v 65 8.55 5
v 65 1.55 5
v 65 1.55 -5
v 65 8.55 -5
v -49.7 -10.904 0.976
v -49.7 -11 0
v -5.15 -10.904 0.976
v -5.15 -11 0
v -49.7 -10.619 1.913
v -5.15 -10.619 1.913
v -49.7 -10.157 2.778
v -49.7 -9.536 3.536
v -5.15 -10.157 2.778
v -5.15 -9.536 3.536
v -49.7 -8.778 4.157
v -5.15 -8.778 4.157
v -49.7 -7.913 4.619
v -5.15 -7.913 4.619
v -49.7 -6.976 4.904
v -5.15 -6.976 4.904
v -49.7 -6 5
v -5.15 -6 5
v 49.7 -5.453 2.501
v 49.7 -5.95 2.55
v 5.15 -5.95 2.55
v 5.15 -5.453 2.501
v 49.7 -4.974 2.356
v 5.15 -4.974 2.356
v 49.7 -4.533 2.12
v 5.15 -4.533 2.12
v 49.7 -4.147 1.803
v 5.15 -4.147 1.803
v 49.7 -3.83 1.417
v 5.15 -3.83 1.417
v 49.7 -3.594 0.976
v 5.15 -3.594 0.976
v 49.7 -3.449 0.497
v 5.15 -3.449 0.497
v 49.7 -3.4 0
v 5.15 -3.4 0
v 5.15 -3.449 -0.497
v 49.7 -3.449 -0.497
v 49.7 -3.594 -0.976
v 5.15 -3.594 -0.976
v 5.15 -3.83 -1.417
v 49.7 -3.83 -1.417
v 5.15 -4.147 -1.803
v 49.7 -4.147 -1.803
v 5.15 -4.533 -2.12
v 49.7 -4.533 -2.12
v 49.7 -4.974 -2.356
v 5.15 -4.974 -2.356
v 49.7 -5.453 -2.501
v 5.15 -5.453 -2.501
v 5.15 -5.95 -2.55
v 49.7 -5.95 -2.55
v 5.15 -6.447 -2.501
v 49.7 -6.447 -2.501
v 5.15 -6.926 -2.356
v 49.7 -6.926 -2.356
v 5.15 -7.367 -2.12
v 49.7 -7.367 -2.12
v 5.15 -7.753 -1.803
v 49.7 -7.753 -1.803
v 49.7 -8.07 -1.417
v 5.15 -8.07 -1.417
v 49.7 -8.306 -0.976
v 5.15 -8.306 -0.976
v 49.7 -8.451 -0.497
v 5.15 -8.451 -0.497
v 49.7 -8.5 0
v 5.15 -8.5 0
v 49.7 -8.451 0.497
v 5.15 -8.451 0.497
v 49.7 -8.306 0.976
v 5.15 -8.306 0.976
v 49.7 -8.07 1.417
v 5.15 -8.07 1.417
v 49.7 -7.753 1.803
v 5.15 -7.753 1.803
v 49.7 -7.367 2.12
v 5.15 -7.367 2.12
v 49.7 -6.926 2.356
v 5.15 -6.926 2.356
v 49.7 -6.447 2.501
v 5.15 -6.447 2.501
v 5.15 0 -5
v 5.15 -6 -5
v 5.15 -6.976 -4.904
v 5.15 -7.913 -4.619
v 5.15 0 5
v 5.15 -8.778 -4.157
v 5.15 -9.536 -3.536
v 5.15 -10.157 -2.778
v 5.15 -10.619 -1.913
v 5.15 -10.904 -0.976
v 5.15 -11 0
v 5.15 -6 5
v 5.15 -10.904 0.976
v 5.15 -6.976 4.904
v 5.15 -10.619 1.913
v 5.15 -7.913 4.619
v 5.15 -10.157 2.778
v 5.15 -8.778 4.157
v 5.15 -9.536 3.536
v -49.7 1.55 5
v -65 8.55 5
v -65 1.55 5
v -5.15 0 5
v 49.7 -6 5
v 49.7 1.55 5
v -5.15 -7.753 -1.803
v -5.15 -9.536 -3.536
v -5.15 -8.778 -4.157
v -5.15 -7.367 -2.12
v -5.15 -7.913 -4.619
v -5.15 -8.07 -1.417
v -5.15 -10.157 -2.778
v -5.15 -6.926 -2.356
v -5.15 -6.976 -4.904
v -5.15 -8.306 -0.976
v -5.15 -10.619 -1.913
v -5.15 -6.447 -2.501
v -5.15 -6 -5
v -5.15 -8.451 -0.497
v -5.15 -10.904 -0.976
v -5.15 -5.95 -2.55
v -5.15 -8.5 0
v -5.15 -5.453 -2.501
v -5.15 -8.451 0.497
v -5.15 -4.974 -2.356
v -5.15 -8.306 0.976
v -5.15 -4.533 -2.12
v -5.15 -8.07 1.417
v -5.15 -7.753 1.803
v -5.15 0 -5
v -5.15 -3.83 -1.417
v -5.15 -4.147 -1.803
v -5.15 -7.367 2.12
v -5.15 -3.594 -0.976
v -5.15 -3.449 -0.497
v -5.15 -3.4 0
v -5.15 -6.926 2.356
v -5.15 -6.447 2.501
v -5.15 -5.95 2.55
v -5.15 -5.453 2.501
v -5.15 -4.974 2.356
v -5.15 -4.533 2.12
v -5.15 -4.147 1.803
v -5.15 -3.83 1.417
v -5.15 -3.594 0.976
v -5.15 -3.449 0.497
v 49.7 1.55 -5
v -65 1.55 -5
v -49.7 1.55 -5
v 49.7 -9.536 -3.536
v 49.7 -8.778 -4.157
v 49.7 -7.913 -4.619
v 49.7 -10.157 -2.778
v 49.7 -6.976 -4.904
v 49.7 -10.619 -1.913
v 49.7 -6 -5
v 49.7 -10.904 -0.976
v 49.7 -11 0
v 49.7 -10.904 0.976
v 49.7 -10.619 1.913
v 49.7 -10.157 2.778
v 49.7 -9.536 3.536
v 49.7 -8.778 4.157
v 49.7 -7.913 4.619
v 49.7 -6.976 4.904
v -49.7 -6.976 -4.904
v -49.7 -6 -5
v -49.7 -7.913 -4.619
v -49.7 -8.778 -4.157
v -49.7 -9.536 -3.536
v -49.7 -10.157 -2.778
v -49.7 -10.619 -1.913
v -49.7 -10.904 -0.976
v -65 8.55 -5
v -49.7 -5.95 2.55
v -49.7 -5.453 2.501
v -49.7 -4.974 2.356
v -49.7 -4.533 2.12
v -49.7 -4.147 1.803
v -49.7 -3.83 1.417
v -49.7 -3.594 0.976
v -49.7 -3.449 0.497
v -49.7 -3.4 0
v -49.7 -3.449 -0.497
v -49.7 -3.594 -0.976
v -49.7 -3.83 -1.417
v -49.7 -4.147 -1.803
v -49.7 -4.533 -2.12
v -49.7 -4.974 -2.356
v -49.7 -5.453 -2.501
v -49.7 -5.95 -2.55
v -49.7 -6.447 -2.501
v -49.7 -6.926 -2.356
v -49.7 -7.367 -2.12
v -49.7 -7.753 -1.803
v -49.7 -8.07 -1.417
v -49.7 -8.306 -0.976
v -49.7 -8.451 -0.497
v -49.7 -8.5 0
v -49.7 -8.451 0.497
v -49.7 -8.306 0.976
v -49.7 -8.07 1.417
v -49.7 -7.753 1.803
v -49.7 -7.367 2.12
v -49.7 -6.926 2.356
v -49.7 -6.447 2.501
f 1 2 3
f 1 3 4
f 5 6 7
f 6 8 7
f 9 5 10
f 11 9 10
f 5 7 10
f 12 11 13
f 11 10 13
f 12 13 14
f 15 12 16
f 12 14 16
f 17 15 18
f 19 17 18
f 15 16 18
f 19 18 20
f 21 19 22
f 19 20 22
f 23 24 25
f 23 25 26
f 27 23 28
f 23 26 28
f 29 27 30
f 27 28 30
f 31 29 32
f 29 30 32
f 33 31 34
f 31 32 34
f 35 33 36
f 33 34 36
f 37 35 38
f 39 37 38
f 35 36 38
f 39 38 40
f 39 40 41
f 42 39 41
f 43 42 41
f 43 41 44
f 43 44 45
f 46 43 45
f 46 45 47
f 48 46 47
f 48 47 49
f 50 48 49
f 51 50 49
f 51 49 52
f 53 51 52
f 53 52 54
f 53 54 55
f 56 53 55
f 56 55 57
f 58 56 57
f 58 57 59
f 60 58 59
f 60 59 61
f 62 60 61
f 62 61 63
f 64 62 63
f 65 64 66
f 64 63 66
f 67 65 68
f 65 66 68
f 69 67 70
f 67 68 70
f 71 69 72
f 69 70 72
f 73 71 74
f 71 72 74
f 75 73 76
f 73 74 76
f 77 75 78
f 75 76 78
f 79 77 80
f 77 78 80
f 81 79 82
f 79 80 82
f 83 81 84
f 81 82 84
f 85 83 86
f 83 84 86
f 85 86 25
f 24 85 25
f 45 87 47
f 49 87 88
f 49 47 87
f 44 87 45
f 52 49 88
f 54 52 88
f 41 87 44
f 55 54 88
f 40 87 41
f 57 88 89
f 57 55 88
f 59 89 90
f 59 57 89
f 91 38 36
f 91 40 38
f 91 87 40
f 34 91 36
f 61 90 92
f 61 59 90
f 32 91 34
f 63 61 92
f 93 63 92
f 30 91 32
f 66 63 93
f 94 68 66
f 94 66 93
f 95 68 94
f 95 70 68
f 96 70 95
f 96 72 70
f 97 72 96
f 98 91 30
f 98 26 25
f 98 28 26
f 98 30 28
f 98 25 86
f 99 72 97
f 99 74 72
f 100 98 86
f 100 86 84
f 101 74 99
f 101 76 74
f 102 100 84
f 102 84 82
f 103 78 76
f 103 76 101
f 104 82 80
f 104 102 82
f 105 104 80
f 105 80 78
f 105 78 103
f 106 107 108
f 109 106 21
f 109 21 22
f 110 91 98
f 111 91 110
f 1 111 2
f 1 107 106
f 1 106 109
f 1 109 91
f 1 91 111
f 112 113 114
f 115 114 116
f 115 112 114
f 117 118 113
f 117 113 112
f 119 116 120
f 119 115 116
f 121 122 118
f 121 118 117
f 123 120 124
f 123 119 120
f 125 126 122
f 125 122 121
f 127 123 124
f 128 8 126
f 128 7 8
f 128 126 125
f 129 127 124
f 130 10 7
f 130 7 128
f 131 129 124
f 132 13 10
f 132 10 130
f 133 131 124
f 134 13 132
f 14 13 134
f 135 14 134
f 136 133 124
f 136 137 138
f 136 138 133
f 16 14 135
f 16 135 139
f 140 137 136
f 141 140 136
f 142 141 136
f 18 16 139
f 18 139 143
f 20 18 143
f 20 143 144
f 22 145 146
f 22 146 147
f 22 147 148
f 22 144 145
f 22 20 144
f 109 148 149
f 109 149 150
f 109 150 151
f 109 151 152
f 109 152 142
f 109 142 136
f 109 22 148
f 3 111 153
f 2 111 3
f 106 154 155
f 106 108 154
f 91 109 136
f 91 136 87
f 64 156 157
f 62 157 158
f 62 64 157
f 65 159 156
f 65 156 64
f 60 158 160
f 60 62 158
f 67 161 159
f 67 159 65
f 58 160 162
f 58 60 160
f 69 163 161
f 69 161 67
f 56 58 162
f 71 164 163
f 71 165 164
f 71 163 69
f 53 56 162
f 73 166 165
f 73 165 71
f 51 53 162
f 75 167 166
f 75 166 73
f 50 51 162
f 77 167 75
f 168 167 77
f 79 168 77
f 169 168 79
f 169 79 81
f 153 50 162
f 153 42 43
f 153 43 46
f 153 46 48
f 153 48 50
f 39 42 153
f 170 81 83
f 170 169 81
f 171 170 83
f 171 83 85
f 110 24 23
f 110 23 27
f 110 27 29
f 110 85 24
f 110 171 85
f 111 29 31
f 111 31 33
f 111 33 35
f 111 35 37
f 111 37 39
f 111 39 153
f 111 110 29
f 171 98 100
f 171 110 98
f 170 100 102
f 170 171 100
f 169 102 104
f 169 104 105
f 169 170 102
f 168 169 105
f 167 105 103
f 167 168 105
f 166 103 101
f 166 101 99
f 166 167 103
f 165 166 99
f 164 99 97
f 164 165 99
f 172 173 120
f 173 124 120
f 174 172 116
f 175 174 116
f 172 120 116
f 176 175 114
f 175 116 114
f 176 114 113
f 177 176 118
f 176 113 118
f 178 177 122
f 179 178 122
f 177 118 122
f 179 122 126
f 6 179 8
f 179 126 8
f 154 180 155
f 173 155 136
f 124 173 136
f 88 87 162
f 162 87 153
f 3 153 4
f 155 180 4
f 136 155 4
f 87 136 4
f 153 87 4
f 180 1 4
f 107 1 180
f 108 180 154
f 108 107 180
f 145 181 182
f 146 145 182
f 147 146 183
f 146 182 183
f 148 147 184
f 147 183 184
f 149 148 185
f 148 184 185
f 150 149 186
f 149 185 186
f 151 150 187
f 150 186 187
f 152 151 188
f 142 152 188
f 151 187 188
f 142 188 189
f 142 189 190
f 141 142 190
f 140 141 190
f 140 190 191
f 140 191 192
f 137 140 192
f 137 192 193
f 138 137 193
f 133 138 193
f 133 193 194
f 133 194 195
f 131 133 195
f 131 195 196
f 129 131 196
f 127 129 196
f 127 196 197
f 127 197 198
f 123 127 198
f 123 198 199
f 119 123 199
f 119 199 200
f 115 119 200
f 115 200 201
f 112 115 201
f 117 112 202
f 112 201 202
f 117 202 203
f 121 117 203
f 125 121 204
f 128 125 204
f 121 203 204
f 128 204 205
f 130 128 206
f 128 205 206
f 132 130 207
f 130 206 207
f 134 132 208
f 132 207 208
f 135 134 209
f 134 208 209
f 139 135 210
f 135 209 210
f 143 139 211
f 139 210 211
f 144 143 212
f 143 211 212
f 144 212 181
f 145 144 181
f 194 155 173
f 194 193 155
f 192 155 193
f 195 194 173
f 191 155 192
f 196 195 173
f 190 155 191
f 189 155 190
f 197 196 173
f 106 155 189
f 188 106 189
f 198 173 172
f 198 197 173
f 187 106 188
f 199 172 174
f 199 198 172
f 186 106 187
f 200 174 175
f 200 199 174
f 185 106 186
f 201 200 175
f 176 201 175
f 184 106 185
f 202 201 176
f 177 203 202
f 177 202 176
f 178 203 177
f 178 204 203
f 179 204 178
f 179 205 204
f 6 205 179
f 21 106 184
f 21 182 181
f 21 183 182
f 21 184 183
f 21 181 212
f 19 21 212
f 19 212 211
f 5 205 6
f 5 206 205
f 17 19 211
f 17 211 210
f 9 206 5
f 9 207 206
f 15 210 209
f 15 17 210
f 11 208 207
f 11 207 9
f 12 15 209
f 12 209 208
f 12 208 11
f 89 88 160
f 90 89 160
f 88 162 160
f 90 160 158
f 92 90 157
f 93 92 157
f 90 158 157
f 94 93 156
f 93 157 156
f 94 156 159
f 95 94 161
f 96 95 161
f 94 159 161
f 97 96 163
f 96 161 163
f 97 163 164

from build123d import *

# Parameters (mm, degrees)
BOSS_EXTRUDE1_DEPTH = 5
SKETCH2_R           = 2.55
CUT_EXTRUDE1_DEPTH  = 131.560330882
FILLET1_R           = 5


with BuildPart() as part:
    # Sketch1 → Boss-Extrude1 (new, symmetric)
    with BuildSketch(Plane.XY):
        Polygon((-49.7, 1.55), (-49.7, -11), (-5.15, -11), (-5.15, 0), (5.15, 0), (5.15, -11), (49.7, -11), (49.7, 1.55), (56, 1.55), (65, 1.55), (65, 8.55), (-65, 8.55), (-65, 1.55), (-56, 1.55), align=None)
    extrude(amount=BOSS_EXTRUDE1_DEPTH, both=True)

    # Sketch2 → Cut-Extrude1 (cut, through all)
    with BuildSketch(Plane.ZY.offset(65)):
        with Locations((0, -5.95)):
            Circle(SKETCH2_R)
    extrude(amount=-CUT_EXTRUDE1_DEPTH, mode=Mode.SUBTRACT)

    # Fillet1
    fillet1_edges = [part.edges().sort_by_distance(p)[0] for p in [
        (-27.425, -11, 5),
        (27.425, -11, 5),
        (-27.425, -11, -5),
        (27.425, -11, -5),
    ]]
    fillet(fillet1_edges, radius=FILLET1_R - 0.0001)  # a hair under: the kernel refuses the full size


solid = part.part
